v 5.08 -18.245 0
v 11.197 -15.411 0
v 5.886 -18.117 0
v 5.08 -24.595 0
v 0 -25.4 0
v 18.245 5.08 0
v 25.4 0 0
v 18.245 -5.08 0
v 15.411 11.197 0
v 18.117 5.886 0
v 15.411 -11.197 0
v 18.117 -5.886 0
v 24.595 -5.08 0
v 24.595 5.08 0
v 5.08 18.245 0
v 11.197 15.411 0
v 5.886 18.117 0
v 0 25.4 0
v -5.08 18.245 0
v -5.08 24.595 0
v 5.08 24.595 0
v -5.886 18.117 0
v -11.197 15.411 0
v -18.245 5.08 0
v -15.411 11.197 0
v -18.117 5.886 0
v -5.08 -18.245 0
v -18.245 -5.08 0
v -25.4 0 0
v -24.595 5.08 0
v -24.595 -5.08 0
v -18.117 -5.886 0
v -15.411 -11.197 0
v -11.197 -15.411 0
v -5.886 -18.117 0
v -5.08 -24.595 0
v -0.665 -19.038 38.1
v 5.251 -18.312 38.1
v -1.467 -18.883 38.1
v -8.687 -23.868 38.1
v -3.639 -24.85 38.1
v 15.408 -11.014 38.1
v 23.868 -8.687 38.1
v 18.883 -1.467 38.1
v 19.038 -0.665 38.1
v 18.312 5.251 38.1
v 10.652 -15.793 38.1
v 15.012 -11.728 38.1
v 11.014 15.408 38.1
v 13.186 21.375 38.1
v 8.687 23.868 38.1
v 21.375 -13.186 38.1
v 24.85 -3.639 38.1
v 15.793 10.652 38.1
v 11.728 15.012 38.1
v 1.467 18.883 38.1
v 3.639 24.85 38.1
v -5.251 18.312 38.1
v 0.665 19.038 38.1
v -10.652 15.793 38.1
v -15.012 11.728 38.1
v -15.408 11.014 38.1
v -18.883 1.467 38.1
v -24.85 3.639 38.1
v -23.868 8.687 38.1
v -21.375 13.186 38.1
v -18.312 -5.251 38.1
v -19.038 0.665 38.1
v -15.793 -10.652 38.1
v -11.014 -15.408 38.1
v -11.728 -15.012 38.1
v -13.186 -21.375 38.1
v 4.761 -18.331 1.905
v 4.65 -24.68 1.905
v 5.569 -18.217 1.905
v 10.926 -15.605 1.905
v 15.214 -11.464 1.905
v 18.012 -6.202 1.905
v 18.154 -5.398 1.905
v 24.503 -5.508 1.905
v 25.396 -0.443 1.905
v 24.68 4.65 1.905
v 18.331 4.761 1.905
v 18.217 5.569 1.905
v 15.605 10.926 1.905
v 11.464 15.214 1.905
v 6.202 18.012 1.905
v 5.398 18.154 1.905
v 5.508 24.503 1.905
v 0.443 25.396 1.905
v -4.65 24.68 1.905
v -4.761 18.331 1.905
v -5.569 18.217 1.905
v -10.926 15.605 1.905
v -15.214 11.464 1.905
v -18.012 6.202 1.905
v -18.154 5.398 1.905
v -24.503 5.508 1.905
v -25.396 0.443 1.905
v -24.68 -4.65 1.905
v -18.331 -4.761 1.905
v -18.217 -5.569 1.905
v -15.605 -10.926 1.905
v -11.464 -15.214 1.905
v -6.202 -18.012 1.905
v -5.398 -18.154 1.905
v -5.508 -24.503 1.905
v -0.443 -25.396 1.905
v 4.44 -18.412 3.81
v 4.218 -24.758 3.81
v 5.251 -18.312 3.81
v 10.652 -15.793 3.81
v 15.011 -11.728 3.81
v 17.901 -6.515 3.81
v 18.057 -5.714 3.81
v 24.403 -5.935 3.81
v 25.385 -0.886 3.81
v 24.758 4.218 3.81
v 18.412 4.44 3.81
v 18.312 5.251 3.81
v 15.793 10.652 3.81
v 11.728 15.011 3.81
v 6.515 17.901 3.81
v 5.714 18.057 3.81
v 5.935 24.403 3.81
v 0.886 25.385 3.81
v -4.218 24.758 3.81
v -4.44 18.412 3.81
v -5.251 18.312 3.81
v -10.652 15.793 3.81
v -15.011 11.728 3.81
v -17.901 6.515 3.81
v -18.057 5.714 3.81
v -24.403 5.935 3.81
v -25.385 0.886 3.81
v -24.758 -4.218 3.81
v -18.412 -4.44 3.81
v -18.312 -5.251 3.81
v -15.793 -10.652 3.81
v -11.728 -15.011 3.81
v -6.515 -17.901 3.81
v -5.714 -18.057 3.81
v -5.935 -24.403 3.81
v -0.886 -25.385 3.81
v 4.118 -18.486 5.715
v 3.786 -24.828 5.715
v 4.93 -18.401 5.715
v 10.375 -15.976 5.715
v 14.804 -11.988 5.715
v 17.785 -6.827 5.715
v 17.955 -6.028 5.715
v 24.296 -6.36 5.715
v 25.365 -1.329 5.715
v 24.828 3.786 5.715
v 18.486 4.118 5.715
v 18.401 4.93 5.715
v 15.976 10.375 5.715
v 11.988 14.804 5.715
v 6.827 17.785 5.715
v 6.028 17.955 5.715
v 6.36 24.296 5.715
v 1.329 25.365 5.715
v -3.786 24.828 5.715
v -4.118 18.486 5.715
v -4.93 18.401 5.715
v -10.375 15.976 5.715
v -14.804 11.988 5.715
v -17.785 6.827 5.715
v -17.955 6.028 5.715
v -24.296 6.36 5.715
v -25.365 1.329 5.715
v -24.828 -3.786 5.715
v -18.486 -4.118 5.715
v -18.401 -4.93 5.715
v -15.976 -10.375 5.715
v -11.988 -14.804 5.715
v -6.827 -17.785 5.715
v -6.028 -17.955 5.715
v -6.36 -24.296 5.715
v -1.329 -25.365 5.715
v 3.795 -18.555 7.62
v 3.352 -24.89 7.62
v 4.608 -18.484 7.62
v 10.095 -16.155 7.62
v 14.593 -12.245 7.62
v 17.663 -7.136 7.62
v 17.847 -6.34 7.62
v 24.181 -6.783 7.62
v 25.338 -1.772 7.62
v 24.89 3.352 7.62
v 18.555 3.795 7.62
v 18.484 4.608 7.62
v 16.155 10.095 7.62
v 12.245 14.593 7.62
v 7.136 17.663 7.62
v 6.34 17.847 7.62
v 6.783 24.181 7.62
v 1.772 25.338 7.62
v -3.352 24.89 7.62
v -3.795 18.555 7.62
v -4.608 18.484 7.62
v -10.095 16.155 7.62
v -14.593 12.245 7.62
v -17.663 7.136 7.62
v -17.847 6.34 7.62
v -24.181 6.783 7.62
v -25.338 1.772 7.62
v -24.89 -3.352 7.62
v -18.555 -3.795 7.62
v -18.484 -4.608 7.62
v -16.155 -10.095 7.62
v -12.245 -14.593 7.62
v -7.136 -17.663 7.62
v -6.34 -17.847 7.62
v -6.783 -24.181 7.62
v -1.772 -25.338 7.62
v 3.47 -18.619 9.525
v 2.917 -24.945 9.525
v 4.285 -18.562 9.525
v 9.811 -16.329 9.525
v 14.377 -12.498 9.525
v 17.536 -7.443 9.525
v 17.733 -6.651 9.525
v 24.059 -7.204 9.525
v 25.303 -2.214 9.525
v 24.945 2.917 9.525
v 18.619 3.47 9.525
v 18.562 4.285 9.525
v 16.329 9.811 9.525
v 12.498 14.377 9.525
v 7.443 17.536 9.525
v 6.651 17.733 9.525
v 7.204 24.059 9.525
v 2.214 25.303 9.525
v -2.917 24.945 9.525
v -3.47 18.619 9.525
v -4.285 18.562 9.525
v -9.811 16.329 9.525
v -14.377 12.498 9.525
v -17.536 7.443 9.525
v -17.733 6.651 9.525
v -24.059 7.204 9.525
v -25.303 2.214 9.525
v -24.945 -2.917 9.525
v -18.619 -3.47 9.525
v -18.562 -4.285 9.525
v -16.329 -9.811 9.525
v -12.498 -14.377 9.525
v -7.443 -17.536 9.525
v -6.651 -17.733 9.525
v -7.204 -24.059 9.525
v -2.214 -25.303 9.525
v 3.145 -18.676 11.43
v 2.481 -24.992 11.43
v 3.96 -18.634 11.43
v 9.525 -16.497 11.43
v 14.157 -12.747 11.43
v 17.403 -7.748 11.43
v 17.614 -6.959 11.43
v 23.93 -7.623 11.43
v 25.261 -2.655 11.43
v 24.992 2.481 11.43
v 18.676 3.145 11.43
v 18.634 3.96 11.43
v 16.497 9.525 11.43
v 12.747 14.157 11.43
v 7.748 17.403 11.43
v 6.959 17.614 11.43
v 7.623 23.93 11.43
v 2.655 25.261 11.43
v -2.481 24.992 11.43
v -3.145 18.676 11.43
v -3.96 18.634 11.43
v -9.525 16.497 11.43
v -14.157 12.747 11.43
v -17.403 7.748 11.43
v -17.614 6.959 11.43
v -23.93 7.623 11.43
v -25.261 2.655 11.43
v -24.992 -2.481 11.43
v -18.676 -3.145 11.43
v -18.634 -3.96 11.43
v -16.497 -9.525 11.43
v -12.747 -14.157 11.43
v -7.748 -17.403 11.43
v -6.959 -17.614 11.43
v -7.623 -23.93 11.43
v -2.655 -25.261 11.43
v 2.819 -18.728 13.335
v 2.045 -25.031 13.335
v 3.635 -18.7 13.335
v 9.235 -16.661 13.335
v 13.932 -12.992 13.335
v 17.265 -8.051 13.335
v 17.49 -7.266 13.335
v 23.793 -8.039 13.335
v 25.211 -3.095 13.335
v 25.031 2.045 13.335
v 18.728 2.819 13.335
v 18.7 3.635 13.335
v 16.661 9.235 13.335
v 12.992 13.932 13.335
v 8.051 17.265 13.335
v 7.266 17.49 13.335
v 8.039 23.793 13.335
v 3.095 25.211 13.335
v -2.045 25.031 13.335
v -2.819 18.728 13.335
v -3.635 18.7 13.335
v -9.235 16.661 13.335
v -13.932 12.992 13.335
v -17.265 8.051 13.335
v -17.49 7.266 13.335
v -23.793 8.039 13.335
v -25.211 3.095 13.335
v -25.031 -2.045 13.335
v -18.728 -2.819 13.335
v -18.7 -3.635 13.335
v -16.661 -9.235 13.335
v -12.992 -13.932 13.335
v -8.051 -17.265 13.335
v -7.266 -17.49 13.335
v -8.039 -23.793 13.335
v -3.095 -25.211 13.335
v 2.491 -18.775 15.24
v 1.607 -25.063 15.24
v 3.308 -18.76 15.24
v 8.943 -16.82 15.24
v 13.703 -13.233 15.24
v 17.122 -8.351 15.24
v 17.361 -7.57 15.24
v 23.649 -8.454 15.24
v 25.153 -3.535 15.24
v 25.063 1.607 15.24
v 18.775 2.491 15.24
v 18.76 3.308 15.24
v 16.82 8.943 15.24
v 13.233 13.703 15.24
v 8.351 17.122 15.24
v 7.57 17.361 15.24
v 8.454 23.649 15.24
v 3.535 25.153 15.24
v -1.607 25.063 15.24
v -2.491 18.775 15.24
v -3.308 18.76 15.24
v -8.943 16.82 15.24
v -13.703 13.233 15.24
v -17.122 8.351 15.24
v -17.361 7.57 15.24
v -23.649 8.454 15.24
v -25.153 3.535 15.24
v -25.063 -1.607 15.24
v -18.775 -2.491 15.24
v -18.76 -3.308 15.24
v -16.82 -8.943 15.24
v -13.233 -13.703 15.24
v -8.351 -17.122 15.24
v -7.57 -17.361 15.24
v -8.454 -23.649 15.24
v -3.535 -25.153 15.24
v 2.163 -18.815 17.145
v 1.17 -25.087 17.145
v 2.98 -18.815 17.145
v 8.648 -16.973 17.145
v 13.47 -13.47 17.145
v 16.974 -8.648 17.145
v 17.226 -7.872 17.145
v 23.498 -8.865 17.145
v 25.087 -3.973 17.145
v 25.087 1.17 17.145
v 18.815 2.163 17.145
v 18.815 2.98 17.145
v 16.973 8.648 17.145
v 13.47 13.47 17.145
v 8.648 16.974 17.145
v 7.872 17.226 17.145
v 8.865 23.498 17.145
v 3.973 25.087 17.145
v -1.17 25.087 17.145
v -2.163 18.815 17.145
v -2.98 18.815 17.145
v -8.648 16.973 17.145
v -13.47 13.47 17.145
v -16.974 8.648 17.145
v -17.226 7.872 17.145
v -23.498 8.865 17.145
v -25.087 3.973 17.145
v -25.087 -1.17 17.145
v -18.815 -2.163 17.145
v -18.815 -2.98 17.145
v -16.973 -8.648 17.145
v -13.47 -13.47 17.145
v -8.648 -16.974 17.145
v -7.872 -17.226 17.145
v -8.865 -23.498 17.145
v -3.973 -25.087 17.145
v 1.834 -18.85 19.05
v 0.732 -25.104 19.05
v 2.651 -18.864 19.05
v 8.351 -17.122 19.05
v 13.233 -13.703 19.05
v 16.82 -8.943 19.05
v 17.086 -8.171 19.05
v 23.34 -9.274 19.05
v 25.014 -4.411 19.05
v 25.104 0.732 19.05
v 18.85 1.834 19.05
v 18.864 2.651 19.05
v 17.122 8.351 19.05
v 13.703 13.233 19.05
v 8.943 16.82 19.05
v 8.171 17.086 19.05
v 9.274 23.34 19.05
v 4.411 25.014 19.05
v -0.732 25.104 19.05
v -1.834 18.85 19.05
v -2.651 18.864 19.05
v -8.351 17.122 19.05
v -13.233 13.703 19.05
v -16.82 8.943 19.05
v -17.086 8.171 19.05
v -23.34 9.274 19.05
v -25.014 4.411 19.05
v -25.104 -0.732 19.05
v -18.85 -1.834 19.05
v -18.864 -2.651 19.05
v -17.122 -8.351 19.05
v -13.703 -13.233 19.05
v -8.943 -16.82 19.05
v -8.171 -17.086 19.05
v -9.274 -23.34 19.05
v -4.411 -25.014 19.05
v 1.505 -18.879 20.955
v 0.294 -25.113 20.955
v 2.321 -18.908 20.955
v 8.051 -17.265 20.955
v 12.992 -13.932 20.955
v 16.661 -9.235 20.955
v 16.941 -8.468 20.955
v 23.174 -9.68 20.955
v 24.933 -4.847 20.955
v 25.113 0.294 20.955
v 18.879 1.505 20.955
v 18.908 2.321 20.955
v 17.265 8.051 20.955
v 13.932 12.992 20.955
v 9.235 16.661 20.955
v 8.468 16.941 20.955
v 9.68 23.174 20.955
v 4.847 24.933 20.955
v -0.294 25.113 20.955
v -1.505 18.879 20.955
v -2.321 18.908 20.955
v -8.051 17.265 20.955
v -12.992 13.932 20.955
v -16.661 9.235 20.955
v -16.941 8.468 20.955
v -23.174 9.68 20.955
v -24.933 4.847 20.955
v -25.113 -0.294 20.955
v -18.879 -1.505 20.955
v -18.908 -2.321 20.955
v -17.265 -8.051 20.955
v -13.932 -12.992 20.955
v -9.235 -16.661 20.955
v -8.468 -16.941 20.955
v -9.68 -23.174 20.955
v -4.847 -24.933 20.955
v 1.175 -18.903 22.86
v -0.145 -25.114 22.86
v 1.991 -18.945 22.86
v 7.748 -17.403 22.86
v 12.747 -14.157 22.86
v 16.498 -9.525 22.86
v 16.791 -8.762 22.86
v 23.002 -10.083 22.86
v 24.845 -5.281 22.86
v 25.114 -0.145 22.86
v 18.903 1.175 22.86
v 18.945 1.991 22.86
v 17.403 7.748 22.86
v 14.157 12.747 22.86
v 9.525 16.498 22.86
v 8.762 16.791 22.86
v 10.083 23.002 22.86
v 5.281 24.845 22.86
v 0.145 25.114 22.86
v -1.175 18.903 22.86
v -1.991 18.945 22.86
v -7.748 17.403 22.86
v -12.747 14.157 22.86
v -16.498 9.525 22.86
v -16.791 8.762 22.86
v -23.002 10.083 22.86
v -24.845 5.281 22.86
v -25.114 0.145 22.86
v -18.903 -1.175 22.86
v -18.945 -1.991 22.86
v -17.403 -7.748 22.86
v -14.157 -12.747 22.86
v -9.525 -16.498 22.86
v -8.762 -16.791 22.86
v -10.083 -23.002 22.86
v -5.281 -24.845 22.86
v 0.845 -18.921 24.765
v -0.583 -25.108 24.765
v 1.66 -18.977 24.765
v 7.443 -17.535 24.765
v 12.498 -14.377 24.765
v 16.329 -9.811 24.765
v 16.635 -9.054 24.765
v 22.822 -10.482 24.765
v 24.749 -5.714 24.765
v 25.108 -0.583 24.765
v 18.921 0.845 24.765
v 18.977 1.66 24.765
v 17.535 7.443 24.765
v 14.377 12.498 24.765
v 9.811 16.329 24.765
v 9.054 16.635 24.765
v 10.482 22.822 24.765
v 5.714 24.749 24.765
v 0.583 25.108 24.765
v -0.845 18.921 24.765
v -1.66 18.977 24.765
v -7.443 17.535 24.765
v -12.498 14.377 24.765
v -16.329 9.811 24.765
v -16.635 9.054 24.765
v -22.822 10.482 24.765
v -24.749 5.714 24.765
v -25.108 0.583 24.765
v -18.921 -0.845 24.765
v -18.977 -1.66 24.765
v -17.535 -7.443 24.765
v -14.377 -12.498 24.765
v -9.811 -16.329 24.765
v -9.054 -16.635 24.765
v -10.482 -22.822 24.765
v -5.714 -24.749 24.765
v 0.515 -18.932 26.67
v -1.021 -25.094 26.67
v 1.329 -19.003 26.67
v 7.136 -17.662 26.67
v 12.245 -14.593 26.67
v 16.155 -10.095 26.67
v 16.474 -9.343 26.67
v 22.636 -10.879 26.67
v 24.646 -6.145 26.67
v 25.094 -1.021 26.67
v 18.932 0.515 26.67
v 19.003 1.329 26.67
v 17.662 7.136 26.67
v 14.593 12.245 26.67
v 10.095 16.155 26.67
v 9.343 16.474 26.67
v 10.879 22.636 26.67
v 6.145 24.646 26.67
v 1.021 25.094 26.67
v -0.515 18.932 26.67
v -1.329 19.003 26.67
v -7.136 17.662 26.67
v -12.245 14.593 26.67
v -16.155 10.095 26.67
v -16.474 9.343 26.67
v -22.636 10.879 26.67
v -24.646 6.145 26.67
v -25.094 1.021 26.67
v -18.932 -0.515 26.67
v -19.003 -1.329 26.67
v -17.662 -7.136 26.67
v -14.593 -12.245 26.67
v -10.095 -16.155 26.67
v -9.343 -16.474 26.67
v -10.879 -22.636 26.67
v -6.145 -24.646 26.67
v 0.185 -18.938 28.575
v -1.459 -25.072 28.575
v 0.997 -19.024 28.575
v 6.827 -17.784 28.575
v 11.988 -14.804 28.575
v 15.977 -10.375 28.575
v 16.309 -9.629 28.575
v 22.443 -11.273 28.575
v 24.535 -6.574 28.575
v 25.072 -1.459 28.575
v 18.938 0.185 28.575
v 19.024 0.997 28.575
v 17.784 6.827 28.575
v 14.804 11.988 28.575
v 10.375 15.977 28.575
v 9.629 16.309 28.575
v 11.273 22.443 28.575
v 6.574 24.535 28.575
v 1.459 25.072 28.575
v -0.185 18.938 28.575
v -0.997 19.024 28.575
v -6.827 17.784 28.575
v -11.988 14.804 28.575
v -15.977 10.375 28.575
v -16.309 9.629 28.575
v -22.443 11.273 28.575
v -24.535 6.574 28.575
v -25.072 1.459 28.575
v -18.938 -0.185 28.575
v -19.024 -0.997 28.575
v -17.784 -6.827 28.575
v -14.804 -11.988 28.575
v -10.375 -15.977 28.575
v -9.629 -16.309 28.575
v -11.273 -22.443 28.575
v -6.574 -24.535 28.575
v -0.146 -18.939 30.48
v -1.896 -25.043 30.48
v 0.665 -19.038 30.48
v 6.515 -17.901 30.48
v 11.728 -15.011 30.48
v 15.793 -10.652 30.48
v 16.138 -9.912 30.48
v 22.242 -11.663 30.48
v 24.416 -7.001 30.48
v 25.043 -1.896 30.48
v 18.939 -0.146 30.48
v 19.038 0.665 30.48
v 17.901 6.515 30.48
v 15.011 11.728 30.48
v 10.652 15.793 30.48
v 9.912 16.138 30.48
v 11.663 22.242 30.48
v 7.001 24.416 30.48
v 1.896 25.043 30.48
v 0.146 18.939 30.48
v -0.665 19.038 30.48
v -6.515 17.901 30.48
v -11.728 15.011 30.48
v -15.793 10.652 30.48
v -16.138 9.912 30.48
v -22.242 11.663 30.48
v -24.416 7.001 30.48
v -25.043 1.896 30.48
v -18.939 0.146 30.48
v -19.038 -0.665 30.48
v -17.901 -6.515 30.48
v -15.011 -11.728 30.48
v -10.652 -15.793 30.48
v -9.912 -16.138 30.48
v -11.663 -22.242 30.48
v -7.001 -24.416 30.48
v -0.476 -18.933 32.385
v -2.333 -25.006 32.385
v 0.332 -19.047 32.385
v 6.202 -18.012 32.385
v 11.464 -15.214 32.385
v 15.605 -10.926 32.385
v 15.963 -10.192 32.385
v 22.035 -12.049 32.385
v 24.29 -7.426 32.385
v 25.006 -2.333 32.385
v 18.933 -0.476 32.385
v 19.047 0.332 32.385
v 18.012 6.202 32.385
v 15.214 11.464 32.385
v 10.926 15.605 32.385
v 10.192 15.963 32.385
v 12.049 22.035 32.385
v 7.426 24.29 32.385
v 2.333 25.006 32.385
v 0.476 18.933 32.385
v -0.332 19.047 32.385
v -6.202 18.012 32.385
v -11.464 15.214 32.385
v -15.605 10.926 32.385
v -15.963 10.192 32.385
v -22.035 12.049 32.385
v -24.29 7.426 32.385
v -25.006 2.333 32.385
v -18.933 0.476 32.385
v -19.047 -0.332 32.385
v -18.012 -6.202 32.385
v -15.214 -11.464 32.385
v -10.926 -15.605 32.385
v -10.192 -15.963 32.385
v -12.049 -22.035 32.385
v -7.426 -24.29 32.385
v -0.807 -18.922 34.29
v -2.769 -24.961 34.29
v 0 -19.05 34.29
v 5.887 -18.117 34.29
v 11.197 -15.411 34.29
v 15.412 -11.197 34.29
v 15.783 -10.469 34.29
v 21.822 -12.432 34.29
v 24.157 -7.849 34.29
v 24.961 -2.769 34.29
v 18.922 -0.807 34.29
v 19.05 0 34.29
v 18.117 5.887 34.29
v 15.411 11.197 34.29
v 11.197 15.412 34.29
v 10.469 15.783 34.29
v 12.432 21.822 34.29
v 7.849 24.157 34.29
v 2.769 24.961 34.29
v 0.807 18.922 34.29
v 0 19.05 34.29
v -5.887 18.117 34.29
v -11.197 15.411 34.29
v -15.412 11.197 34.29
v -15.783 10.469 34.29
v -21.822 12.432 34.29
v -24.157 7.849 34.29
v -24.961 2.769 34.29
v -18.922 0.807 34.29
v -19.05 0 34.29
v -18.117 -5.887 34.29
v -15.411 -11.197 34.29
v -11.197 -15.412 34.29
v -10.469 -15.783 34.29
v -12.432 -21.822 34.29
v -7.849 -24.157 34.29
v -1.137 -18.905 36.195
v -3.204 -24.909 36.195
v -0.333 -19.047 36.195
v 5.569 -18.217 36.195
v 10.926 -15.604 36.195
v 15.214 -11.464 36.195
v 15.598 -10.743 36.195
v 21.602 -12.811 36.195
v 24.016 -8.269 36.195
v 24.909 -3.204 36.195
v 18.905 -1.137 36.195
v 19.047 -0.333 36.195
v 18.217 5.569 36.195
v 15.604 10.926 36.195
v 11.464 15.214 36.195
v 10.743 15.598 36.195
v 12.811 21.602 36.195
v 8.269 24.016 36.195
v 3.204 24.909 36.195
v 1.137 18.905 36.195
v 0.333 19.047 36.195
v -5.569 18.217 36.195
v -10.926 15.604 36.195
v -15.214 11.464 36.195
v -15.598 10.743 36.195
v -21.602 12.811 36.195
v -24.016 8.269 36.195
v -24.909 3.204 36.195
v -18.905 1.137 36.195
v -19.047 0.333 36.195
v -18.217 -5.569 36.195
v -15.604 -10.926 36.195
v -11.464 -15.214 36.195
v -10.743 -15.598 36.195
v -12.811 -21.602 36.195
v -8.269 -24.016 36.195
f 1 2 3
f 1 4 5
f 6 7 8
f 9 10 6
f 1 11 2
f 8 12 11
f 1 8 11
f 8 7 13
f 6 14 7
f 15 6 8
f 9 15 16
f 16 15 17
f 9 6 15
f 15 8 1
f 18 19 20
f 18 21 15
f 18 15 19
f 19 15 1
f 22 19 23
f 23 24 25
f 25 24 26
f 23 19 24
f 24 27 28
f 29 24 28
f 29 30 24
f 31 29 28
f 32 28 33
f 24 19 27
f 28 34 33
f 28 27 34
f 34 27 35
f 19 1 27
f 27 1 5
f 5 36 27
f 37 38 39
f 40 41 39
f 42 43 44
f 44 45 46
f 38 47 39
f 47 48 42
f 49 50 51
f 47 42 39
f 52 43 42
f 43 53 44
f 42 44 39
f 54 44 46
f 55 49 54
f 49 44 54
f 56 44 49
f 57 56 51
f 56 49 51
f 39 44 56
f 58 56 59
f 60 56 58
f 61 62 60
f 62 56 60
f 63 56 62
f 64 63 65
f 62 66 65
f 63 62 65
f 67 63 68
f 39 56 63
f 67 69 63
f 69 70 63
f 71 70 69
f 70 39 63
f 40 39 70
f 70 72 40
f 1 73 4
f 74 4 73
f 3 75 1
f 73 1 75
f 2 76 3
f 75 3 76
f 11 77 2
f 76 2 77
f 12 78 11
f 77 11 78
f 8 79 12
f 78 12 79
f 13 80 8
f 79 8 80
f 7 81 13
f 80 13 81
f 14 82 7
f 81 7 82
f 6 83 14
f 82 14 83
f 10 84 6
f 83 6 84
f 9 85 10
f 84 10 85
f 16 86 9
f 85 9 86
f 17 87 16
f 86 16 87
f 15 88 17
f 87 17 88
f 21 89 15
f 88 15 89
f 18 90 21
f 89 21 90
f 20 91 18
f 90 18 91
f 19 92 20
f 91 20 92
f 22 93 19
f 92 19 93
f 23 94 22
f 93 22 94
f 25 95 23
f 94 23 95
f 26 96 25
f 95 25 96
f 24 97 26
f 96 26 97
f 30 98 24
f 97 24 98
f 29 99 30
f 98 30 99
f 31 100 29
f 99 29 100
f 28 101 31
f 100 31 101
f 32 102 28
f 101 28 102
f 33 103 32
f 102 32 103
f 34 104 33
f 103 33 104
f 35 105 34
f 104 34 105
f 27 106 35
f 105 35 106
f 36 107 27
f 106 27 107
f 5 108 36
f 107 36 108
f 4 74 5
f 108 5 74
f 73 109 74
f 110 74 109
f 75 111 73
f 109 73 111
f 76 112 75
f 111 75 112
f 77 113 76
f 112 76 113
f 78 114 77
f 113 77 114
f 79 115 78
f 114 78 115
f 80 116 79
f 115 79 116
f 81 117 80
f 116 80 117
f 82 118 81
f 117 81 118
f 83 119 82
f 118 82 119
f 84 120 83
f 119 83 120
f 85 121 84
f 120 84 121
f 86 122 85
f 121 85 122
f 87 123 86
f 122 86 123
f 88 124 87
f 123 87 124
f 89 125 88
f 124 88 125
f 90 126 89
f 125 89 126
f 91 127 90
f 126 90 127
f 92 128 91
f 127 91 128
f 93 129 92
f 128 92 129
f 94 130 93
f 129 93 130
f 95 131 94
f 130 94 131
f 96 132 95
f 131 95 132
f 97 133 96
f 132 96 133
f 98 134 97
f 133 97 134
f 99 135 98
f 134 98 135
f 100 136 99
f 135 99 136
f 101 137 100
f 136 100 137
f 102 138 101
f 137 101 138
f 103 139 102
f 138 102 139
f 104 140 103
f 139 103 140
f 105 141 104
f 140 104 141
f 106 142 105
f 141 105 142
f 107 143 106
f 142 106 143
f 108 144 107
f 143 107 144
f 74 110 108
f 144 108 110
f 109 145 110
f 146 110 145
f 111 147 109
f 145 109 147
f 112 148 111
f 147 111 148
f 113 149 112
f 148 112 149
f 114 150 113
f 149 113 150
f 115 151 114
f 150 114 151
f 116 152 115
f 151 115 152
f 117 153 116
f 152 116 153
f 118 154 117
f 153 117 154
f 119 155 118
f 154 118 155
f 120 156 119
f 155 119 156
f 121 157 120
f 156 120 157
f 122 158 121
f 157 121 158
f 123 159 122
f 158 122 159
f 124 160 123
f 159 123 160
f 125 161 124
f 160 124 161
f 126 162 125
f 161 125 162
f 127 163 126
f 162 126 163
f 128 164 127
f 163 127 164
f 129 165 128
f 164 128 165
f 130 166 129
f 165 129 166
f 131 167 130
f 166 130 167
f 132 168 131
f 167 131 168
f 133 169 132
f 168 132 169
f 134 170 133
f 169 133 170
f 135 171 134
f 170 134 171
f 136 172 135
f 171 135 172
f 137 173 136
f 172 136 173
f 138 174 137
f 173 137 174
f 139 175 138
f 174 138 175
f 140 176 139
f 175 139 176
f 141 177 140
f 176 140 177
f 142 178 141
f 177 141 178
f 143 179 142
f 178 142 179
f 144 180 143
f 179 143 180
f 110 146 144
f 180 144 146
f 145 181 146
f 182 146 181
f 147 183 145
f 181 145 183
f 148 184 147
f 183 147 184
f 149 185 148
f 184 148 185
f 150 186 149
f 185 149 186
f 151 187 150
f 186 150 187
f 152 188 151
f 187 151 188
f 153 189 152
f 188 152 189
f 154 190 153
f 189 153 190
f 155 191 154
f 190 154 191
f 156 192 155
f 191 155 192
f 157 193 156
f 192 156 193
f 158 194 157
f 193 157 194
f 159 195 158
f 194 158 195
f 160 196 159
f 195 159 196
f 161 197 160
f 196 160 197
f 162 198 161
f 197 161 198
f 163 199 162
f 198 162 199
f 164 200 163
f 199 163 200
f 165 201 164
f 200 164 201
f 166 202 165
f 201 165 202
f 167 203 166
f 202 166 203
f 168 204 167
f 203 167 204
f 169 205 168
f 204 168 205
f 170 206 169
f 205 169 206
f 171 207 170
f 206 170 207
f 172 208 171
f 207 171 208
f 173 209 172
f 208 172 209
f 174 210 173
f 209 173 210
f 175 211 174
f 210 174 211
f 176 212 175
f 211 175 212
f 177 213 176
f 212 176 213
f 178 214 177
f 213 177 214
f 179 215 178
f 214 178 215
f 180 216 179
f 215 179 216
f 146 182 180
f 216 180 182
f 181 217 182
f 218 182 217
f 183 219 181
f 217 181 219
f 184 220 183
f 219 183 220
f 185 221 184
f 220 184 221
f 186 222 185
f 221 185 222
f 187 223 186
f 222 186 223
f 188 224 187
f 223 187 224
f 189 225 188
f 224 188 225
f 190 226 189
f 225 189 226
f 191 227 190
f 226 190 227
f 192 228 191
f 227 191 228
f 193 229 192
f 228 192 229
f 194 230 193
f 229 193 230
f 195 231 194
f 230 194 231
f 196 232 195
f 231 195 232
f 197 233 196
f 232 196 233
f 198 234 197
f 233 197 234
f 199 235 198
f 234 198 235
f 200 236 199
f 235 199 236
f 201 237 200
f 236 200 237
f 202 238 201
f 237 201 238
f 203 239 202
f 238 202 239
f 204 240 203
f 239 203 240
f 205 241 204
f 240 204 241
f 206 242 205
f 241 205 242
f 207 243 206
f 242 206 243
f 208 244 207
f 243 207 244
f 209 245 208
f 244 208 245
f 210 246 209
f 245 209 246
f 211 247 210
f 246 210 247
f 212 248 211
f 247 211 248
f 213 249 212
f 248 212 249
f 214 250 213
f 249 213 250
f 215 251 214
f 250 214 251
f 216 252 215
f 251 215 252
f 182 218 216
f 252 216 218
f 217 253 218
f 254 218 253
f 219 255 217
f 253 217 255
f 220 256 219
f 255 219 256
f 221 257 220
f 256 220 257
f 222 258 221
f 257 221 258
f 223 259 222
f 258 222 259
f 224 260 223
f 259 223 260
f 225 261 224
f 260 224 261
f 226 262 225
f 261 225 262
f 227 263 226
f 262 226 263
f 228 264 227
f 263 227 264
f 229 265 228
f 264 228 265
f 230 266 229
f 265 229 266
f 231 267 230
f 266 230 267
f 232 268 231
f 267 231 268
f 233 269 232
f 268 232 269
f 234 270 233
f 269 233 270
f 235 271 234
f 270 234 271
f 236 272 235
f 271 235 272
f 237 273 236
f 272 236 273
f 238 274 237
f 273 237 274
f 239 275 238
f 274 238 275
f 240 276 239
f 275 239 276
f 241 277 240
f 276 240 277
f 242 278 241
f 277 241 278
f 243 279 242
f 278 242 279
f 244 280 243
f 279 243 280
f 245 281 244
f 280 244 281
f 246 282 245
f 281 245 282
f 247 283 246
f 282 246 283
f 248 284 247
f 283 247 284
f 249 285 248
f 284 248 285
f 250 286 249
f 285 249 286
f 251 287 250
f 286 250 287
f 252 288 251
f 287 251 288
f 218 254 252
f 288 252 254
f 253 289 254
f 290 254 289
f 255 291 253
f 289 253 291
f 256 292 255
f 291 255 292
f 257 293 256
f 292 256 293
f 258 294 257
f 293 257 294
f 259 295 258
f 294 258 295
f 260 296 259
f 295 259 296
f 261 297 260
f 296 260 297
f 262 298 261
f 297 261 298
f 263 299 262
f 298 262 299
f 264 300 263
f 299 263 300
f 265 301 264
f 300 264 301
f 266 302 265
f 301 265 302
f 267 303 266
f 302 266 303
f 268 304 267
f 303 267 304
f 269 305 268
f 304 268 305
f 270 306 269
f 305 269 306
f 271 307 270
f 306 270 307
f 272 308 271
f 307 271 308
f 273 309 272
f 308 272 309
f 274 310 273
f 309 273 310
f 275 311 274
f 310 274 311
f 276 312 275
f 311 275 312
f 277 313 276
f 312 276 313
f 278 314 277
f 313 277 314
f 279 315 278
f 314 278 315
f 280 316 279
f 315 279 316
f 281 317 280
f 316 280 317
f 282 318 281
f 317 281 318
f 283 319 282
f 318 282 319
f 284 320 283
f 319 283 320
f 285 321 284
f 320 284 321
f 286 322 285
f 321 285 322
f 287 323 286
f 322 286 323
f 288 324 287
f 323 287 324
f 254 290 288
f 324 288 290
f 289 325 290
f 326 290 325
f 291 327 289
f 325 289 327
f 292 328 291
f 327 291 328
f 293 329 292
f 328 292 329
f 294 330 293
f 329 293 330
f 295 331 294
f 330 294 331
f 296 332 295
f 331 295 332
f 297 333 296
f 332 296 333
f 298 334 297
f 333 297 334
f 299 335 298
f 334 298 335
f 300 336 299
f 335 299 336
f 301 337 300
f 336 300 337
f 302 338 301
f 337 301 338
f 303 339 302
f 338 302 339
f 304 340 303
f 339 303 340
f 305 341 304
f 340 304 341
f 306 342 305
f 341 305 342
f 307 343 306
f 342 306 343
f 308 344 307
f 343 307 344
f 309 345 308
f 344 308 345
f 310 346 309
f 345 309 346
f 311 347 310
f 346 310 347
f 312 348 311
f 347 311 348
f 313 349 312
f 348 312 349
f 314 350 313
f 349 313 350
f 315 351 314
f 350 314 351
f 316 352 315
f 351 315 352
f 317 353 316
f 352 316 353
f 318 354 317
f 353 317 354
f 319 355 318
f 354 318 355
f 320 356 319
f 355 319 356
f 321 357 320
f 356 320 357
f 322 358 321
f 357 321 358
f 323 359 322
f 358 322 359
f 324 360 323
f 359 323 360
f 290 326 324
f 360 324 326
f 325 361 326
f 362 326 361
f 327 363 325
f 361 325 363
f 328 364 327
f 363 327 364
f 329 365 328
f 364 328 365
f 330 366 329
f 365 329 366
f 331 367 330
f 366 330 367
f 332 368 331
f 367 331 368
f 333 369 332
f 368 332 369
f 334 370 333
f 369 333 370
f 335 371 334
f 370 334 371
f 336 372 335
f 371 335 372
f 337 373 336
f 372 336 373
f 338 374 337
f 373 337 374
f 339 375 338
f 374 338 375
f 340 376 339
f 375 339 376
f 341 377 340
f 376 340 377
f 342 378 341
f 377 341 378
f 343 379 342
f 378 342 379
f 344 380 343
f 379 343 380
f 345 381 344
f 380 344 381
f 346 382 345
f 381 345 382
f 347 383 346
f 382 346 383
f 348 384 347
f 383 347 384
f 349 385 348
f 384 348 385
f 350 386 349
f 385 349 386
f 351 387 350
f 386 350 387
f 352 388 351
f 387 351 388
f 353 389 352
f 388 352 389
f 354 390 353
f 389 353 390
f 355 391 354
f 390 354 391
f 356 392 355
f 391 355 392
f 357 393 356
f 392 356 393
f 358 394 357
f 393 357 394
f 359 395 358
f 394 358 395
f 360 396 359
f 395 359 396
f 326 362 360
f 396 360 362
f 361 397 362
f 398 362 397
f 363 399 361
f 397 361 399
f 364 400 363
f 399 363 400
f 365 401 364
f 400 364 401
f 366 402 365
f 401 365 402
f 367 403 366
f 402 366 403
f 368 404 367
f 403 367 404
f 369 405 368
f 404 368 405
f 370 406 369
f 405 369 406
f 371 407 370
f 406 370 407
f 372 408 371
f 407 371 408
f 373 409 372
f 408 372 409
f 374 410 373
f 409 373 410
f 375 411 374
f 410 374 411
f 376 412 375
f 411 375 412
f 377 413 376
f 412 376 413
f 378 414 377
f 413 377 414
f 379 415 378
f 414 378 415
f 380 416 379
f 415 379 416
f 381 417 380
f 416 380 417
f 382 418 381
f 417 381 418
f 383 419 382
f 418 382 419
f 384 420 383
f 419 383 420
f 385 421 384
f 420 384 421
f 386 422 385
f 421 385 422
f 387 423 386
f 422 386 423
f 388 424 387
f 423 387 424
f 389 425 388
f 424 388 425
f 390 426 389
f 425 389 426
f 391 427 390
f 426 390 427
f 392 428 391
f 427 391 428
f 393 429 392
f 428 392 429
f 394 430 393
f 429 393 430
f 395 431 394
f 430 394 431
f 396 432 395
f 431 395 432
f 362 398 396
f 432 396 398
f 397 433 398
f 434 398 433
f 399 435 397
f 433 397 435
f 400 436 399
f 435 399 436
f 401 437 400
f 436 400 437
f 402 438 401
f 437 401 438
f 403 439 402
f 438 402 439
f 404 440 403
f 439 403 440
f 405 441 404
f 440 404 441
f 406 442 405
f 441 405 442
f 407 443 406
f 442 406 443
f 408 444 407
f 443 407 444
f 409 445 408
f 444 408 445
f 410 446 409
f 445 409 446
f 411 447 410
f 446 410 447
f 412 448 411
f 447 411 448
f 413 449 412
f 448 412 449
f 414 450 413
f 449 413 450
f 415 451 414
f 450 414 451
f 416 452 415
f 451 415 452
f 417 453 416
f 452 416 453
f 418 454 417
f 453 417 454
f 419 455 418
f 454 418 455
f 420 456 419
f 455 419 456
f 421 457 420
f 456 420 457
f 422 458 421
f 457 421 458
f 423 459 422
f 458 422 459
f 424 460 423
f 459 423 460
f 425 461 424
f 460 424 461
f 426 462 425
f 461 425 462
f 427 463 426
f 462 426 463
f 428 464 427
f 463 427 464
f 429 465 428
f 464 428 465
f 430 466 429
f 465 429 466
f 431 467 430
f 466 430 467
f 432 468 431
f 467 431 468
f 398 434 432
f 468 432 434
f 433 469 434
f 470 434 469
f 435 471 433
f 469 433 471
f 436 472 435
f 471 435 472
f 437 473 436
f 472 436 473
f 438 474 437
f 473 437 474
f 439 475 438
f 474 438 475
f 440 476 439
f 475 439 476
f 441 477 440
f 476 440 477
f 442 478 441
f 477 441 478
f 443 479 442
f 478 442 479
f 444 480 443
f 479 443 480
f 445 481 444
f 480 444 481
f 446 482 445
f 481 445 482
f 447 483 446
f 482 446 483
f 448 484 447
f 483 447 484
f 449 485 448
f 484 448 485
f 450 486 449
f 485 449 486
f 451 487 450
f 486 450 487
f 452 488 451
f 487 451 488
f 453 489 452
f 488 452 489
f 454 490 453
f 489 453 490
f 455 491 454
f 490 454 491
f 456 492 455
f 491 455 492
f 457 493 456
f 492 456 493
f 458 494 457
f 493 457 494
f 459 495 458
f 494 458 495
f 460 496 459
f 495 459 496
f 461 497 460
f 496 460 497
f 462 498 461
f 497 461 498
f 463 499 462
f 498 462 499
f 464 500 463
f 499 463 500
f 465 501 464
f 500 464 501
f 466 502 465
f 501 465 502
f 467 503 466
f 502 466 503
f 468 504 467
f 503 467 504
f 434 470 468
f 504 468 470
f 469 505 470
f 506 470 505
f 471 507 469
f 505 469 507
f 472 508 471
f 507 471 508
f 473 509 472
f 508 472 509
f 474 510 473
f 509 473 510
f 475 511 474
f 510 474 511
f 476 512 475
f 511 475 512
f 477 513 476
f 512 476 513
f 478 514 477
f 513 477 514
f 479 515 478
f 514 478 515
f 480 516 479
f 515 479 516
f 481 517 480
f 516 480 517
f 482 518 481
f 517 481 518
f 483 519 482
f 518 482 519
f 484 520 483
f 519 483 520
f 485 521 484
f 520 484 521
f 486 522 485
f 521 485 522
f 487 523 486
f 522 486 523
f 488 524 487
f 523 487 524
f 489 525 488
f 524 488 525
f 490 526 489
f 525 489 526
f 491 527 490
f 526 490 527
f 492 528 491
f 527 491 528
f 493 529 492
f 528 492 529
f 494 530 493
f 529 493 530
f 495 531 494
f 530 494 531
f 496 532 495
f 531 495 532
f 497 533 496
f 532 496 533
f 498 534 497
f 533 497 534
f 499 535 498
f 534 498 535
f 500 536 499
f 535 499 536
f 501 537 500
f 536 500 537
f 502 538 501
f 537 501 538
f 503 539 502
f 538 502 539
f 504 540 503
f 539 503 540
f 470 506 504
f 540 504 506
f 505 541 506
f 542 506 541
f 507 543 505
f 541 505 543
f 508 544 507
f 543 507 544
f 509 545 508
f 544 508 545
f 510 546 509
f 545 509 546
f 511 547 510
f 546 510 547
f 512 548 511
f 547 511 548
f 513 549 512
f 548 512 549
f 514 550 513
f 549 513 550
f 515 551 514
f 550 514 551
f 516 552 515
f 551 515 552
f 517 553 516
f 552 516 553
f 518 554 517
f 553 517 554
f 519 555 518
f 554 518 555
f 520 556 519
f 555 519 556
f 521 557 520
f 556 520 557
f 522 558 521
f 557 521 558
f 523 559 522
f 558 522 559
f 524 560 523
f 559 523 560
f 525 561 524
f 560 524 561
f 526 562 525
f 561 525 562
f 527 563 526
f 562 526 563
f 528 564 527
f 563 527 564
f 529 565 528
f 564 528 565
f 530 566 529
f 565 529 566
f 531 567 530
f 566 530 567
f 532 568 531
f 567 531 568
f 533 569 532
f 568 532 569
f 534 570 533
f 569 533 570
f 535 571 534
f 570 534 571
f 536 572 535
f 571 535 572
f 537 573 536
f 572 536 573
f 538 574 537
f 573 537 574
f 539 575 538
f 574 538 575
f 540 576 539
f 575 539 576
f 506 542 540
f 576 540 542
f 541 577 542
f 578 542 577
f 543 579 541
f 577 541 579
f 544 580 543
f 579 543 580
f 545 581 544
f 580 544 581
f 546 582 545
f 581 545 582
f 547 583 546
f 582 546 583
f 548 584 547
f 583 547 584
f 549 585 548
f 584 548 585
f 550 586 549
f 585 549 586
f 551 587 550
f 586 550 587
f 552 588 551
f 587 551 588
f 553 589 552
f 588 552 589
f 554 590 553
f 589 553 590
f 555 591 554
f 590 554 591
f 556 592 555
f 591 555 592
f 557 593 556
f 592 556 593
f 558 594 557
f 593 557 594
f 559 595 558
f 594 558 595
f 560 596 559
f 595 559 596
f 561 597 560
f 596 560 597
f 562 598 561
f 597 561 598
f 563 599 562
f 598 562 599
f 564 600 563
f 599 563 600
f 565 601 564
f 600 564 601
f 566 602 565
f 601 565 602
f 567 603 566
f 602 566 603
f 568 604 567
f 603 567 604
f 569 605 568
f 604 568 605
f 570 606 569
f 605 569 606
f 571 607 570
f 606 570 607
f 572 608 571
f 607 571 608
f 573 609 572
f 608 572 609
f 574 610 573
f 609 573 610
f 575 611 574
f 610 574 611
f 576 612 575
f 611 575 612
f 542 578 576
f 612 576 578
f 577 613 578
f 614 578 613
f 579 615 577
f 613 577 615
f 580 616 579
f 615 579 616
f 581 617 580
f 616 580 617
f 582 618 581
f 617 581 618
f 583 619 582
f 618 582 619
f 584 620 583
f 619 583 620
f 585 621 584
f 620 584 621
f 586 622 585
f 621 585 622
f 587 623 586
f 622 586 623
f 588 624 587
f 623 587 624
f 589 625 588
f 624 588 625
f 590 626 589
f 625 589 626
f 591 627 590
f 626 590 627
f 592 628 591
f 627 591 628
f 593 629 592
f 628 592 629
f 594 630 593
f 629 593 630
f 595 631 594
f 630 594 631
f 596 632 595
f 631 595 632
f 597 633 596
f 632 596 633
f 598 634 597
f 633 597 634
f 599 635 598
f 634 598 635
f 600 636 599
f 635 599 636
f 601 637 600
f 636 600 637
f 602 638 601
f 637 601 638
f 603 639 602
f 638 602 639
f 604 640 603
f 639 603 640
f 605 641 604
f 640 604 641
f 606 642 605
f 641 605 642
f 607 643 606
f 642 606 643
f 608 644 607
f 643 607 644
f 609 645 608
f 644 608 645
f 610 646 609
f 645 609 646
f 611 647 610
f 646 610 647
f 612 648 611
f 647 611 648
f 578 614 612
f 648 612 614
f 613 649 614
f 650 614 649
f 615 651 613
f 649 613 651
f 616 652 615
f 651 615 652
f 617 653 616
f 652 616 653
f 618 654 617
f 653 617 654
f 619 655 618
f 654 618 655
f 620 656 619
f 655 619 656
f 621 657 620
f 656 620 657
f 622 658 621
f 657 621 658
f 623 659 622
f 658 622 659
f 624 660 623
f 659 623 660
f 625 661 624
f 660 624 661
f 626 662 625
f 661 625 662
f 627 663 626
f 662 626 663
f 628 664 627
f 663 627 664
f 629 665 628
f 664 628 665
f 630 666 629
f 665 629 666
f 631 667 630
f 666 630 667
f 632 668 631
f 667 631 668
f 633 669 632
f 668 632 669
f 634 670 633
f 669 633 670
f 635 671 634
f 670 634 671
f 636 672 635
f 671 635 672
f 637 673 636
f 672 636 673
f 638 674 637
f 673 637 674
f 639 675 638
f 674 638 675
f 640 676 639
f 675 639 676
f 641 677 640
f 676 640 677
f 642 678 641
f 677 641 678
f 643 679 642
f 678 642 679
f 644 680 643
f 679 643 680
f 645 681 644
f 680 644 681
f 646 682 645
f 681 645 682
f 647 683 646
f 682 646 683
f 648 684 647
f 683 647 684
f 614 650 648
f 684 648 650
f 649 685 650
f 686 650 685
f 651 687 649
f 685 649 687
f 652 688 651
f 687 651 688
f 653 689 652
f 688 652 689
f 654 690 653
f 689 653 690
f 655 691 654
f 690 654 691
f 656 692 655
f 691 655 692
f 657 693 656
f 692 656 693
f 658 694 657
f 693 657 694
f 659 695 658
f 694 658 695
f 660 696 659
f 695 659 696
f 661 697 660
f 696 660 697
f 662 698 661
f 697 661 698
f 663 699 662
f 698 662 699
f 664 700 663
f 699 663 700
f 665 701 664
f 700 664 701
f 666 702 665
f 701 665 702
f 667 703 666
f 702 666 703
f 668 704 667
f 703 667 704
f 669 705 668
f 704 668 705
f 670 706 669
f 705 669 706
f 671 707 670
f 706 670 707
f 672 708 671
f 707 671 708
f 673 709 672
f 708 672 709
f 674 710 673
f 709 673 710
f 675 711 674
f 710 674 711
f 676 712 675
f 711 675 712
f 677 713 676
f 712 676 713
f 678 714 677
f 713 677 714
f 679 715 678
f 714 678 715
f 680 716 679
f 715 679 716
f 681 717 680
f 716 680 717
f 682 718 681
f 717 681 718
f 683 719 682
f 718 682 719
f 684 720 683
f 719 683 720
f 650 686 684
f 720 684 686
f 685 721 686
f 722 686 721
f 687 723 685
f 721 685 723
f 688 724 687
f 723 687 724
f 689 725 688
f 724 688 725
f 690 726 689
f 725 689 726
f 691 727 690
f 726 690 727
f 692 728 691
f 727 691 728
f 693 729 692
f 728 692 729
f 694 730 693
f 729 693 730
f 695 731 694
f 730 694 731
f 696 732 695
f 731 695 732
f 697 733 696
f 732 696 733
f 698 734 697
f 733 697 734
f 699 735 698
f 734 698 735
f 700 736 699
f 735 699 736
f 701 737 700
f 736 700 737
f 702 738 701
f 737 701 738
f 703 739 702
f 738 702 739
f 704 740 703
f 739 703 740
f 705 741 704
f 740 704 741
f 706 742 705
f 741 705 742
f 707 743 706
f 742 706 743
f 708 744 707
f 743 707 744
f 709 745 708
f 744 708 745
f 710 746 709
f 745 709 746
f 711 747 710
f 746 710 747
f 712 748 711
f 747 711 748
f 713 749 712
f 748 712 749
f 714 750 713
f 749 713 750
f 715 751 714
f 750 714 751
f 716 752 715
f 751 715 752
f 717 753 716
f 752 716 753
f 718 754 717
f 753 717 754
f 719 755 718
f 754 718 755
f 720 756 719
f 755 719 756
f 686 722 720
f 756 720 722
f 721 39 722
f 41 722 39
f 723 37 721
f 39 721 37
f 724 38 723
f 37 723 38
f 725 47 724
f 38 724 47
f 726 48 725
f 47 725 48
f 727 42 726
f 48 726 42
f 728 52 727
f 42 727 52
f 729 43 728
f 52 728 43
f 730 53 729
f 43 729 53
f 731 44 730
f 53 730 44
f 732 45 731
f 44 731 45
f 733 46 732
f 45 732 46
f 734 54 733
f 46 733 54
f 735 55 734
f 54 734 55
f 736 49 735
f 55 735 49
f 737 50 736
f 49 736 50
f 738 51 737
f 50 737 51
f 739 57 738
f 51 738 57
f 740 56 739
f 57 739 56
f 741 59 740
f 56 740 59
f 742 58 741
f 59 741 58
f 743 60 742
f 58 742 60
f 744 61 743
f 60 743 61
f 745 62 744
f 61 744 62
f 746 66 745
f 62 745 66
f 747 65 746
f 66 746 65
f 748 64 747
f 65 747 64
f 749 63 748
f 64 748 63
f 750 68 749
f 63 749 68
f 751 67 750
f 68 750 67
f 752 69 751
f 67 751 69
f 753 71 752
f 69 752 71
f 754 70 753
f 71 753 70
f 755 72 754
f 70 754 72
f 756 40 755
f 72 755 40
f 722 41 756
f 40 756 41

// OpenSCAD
module Fins(count=2, major=1, minor=0.75, width=.4, slices=20, twist=20, height=1.5, $fn=20) {
  color("Orange")
  linear_extrude(height=height, twist=twist, slices=slices)
  intersection() {

    // Main fin geometry
    union() {

      for(i = [0 : count-1]) {
        // Fin
        rotate([0,0,180/count*i])
        translate([-width/2, -major*1.5])
        square([width, major*3]);
      }

      // Fin Wall
      circle(r=minor);
    }

    // Intersect with major radius to smooth the edges
    circle(r=major);
  }
}

scale([25.4, 25.4, 25.4])
difference() {
  Fins();

  *translate([-2, 0, -1])
  cube([4,4,4]);
}
